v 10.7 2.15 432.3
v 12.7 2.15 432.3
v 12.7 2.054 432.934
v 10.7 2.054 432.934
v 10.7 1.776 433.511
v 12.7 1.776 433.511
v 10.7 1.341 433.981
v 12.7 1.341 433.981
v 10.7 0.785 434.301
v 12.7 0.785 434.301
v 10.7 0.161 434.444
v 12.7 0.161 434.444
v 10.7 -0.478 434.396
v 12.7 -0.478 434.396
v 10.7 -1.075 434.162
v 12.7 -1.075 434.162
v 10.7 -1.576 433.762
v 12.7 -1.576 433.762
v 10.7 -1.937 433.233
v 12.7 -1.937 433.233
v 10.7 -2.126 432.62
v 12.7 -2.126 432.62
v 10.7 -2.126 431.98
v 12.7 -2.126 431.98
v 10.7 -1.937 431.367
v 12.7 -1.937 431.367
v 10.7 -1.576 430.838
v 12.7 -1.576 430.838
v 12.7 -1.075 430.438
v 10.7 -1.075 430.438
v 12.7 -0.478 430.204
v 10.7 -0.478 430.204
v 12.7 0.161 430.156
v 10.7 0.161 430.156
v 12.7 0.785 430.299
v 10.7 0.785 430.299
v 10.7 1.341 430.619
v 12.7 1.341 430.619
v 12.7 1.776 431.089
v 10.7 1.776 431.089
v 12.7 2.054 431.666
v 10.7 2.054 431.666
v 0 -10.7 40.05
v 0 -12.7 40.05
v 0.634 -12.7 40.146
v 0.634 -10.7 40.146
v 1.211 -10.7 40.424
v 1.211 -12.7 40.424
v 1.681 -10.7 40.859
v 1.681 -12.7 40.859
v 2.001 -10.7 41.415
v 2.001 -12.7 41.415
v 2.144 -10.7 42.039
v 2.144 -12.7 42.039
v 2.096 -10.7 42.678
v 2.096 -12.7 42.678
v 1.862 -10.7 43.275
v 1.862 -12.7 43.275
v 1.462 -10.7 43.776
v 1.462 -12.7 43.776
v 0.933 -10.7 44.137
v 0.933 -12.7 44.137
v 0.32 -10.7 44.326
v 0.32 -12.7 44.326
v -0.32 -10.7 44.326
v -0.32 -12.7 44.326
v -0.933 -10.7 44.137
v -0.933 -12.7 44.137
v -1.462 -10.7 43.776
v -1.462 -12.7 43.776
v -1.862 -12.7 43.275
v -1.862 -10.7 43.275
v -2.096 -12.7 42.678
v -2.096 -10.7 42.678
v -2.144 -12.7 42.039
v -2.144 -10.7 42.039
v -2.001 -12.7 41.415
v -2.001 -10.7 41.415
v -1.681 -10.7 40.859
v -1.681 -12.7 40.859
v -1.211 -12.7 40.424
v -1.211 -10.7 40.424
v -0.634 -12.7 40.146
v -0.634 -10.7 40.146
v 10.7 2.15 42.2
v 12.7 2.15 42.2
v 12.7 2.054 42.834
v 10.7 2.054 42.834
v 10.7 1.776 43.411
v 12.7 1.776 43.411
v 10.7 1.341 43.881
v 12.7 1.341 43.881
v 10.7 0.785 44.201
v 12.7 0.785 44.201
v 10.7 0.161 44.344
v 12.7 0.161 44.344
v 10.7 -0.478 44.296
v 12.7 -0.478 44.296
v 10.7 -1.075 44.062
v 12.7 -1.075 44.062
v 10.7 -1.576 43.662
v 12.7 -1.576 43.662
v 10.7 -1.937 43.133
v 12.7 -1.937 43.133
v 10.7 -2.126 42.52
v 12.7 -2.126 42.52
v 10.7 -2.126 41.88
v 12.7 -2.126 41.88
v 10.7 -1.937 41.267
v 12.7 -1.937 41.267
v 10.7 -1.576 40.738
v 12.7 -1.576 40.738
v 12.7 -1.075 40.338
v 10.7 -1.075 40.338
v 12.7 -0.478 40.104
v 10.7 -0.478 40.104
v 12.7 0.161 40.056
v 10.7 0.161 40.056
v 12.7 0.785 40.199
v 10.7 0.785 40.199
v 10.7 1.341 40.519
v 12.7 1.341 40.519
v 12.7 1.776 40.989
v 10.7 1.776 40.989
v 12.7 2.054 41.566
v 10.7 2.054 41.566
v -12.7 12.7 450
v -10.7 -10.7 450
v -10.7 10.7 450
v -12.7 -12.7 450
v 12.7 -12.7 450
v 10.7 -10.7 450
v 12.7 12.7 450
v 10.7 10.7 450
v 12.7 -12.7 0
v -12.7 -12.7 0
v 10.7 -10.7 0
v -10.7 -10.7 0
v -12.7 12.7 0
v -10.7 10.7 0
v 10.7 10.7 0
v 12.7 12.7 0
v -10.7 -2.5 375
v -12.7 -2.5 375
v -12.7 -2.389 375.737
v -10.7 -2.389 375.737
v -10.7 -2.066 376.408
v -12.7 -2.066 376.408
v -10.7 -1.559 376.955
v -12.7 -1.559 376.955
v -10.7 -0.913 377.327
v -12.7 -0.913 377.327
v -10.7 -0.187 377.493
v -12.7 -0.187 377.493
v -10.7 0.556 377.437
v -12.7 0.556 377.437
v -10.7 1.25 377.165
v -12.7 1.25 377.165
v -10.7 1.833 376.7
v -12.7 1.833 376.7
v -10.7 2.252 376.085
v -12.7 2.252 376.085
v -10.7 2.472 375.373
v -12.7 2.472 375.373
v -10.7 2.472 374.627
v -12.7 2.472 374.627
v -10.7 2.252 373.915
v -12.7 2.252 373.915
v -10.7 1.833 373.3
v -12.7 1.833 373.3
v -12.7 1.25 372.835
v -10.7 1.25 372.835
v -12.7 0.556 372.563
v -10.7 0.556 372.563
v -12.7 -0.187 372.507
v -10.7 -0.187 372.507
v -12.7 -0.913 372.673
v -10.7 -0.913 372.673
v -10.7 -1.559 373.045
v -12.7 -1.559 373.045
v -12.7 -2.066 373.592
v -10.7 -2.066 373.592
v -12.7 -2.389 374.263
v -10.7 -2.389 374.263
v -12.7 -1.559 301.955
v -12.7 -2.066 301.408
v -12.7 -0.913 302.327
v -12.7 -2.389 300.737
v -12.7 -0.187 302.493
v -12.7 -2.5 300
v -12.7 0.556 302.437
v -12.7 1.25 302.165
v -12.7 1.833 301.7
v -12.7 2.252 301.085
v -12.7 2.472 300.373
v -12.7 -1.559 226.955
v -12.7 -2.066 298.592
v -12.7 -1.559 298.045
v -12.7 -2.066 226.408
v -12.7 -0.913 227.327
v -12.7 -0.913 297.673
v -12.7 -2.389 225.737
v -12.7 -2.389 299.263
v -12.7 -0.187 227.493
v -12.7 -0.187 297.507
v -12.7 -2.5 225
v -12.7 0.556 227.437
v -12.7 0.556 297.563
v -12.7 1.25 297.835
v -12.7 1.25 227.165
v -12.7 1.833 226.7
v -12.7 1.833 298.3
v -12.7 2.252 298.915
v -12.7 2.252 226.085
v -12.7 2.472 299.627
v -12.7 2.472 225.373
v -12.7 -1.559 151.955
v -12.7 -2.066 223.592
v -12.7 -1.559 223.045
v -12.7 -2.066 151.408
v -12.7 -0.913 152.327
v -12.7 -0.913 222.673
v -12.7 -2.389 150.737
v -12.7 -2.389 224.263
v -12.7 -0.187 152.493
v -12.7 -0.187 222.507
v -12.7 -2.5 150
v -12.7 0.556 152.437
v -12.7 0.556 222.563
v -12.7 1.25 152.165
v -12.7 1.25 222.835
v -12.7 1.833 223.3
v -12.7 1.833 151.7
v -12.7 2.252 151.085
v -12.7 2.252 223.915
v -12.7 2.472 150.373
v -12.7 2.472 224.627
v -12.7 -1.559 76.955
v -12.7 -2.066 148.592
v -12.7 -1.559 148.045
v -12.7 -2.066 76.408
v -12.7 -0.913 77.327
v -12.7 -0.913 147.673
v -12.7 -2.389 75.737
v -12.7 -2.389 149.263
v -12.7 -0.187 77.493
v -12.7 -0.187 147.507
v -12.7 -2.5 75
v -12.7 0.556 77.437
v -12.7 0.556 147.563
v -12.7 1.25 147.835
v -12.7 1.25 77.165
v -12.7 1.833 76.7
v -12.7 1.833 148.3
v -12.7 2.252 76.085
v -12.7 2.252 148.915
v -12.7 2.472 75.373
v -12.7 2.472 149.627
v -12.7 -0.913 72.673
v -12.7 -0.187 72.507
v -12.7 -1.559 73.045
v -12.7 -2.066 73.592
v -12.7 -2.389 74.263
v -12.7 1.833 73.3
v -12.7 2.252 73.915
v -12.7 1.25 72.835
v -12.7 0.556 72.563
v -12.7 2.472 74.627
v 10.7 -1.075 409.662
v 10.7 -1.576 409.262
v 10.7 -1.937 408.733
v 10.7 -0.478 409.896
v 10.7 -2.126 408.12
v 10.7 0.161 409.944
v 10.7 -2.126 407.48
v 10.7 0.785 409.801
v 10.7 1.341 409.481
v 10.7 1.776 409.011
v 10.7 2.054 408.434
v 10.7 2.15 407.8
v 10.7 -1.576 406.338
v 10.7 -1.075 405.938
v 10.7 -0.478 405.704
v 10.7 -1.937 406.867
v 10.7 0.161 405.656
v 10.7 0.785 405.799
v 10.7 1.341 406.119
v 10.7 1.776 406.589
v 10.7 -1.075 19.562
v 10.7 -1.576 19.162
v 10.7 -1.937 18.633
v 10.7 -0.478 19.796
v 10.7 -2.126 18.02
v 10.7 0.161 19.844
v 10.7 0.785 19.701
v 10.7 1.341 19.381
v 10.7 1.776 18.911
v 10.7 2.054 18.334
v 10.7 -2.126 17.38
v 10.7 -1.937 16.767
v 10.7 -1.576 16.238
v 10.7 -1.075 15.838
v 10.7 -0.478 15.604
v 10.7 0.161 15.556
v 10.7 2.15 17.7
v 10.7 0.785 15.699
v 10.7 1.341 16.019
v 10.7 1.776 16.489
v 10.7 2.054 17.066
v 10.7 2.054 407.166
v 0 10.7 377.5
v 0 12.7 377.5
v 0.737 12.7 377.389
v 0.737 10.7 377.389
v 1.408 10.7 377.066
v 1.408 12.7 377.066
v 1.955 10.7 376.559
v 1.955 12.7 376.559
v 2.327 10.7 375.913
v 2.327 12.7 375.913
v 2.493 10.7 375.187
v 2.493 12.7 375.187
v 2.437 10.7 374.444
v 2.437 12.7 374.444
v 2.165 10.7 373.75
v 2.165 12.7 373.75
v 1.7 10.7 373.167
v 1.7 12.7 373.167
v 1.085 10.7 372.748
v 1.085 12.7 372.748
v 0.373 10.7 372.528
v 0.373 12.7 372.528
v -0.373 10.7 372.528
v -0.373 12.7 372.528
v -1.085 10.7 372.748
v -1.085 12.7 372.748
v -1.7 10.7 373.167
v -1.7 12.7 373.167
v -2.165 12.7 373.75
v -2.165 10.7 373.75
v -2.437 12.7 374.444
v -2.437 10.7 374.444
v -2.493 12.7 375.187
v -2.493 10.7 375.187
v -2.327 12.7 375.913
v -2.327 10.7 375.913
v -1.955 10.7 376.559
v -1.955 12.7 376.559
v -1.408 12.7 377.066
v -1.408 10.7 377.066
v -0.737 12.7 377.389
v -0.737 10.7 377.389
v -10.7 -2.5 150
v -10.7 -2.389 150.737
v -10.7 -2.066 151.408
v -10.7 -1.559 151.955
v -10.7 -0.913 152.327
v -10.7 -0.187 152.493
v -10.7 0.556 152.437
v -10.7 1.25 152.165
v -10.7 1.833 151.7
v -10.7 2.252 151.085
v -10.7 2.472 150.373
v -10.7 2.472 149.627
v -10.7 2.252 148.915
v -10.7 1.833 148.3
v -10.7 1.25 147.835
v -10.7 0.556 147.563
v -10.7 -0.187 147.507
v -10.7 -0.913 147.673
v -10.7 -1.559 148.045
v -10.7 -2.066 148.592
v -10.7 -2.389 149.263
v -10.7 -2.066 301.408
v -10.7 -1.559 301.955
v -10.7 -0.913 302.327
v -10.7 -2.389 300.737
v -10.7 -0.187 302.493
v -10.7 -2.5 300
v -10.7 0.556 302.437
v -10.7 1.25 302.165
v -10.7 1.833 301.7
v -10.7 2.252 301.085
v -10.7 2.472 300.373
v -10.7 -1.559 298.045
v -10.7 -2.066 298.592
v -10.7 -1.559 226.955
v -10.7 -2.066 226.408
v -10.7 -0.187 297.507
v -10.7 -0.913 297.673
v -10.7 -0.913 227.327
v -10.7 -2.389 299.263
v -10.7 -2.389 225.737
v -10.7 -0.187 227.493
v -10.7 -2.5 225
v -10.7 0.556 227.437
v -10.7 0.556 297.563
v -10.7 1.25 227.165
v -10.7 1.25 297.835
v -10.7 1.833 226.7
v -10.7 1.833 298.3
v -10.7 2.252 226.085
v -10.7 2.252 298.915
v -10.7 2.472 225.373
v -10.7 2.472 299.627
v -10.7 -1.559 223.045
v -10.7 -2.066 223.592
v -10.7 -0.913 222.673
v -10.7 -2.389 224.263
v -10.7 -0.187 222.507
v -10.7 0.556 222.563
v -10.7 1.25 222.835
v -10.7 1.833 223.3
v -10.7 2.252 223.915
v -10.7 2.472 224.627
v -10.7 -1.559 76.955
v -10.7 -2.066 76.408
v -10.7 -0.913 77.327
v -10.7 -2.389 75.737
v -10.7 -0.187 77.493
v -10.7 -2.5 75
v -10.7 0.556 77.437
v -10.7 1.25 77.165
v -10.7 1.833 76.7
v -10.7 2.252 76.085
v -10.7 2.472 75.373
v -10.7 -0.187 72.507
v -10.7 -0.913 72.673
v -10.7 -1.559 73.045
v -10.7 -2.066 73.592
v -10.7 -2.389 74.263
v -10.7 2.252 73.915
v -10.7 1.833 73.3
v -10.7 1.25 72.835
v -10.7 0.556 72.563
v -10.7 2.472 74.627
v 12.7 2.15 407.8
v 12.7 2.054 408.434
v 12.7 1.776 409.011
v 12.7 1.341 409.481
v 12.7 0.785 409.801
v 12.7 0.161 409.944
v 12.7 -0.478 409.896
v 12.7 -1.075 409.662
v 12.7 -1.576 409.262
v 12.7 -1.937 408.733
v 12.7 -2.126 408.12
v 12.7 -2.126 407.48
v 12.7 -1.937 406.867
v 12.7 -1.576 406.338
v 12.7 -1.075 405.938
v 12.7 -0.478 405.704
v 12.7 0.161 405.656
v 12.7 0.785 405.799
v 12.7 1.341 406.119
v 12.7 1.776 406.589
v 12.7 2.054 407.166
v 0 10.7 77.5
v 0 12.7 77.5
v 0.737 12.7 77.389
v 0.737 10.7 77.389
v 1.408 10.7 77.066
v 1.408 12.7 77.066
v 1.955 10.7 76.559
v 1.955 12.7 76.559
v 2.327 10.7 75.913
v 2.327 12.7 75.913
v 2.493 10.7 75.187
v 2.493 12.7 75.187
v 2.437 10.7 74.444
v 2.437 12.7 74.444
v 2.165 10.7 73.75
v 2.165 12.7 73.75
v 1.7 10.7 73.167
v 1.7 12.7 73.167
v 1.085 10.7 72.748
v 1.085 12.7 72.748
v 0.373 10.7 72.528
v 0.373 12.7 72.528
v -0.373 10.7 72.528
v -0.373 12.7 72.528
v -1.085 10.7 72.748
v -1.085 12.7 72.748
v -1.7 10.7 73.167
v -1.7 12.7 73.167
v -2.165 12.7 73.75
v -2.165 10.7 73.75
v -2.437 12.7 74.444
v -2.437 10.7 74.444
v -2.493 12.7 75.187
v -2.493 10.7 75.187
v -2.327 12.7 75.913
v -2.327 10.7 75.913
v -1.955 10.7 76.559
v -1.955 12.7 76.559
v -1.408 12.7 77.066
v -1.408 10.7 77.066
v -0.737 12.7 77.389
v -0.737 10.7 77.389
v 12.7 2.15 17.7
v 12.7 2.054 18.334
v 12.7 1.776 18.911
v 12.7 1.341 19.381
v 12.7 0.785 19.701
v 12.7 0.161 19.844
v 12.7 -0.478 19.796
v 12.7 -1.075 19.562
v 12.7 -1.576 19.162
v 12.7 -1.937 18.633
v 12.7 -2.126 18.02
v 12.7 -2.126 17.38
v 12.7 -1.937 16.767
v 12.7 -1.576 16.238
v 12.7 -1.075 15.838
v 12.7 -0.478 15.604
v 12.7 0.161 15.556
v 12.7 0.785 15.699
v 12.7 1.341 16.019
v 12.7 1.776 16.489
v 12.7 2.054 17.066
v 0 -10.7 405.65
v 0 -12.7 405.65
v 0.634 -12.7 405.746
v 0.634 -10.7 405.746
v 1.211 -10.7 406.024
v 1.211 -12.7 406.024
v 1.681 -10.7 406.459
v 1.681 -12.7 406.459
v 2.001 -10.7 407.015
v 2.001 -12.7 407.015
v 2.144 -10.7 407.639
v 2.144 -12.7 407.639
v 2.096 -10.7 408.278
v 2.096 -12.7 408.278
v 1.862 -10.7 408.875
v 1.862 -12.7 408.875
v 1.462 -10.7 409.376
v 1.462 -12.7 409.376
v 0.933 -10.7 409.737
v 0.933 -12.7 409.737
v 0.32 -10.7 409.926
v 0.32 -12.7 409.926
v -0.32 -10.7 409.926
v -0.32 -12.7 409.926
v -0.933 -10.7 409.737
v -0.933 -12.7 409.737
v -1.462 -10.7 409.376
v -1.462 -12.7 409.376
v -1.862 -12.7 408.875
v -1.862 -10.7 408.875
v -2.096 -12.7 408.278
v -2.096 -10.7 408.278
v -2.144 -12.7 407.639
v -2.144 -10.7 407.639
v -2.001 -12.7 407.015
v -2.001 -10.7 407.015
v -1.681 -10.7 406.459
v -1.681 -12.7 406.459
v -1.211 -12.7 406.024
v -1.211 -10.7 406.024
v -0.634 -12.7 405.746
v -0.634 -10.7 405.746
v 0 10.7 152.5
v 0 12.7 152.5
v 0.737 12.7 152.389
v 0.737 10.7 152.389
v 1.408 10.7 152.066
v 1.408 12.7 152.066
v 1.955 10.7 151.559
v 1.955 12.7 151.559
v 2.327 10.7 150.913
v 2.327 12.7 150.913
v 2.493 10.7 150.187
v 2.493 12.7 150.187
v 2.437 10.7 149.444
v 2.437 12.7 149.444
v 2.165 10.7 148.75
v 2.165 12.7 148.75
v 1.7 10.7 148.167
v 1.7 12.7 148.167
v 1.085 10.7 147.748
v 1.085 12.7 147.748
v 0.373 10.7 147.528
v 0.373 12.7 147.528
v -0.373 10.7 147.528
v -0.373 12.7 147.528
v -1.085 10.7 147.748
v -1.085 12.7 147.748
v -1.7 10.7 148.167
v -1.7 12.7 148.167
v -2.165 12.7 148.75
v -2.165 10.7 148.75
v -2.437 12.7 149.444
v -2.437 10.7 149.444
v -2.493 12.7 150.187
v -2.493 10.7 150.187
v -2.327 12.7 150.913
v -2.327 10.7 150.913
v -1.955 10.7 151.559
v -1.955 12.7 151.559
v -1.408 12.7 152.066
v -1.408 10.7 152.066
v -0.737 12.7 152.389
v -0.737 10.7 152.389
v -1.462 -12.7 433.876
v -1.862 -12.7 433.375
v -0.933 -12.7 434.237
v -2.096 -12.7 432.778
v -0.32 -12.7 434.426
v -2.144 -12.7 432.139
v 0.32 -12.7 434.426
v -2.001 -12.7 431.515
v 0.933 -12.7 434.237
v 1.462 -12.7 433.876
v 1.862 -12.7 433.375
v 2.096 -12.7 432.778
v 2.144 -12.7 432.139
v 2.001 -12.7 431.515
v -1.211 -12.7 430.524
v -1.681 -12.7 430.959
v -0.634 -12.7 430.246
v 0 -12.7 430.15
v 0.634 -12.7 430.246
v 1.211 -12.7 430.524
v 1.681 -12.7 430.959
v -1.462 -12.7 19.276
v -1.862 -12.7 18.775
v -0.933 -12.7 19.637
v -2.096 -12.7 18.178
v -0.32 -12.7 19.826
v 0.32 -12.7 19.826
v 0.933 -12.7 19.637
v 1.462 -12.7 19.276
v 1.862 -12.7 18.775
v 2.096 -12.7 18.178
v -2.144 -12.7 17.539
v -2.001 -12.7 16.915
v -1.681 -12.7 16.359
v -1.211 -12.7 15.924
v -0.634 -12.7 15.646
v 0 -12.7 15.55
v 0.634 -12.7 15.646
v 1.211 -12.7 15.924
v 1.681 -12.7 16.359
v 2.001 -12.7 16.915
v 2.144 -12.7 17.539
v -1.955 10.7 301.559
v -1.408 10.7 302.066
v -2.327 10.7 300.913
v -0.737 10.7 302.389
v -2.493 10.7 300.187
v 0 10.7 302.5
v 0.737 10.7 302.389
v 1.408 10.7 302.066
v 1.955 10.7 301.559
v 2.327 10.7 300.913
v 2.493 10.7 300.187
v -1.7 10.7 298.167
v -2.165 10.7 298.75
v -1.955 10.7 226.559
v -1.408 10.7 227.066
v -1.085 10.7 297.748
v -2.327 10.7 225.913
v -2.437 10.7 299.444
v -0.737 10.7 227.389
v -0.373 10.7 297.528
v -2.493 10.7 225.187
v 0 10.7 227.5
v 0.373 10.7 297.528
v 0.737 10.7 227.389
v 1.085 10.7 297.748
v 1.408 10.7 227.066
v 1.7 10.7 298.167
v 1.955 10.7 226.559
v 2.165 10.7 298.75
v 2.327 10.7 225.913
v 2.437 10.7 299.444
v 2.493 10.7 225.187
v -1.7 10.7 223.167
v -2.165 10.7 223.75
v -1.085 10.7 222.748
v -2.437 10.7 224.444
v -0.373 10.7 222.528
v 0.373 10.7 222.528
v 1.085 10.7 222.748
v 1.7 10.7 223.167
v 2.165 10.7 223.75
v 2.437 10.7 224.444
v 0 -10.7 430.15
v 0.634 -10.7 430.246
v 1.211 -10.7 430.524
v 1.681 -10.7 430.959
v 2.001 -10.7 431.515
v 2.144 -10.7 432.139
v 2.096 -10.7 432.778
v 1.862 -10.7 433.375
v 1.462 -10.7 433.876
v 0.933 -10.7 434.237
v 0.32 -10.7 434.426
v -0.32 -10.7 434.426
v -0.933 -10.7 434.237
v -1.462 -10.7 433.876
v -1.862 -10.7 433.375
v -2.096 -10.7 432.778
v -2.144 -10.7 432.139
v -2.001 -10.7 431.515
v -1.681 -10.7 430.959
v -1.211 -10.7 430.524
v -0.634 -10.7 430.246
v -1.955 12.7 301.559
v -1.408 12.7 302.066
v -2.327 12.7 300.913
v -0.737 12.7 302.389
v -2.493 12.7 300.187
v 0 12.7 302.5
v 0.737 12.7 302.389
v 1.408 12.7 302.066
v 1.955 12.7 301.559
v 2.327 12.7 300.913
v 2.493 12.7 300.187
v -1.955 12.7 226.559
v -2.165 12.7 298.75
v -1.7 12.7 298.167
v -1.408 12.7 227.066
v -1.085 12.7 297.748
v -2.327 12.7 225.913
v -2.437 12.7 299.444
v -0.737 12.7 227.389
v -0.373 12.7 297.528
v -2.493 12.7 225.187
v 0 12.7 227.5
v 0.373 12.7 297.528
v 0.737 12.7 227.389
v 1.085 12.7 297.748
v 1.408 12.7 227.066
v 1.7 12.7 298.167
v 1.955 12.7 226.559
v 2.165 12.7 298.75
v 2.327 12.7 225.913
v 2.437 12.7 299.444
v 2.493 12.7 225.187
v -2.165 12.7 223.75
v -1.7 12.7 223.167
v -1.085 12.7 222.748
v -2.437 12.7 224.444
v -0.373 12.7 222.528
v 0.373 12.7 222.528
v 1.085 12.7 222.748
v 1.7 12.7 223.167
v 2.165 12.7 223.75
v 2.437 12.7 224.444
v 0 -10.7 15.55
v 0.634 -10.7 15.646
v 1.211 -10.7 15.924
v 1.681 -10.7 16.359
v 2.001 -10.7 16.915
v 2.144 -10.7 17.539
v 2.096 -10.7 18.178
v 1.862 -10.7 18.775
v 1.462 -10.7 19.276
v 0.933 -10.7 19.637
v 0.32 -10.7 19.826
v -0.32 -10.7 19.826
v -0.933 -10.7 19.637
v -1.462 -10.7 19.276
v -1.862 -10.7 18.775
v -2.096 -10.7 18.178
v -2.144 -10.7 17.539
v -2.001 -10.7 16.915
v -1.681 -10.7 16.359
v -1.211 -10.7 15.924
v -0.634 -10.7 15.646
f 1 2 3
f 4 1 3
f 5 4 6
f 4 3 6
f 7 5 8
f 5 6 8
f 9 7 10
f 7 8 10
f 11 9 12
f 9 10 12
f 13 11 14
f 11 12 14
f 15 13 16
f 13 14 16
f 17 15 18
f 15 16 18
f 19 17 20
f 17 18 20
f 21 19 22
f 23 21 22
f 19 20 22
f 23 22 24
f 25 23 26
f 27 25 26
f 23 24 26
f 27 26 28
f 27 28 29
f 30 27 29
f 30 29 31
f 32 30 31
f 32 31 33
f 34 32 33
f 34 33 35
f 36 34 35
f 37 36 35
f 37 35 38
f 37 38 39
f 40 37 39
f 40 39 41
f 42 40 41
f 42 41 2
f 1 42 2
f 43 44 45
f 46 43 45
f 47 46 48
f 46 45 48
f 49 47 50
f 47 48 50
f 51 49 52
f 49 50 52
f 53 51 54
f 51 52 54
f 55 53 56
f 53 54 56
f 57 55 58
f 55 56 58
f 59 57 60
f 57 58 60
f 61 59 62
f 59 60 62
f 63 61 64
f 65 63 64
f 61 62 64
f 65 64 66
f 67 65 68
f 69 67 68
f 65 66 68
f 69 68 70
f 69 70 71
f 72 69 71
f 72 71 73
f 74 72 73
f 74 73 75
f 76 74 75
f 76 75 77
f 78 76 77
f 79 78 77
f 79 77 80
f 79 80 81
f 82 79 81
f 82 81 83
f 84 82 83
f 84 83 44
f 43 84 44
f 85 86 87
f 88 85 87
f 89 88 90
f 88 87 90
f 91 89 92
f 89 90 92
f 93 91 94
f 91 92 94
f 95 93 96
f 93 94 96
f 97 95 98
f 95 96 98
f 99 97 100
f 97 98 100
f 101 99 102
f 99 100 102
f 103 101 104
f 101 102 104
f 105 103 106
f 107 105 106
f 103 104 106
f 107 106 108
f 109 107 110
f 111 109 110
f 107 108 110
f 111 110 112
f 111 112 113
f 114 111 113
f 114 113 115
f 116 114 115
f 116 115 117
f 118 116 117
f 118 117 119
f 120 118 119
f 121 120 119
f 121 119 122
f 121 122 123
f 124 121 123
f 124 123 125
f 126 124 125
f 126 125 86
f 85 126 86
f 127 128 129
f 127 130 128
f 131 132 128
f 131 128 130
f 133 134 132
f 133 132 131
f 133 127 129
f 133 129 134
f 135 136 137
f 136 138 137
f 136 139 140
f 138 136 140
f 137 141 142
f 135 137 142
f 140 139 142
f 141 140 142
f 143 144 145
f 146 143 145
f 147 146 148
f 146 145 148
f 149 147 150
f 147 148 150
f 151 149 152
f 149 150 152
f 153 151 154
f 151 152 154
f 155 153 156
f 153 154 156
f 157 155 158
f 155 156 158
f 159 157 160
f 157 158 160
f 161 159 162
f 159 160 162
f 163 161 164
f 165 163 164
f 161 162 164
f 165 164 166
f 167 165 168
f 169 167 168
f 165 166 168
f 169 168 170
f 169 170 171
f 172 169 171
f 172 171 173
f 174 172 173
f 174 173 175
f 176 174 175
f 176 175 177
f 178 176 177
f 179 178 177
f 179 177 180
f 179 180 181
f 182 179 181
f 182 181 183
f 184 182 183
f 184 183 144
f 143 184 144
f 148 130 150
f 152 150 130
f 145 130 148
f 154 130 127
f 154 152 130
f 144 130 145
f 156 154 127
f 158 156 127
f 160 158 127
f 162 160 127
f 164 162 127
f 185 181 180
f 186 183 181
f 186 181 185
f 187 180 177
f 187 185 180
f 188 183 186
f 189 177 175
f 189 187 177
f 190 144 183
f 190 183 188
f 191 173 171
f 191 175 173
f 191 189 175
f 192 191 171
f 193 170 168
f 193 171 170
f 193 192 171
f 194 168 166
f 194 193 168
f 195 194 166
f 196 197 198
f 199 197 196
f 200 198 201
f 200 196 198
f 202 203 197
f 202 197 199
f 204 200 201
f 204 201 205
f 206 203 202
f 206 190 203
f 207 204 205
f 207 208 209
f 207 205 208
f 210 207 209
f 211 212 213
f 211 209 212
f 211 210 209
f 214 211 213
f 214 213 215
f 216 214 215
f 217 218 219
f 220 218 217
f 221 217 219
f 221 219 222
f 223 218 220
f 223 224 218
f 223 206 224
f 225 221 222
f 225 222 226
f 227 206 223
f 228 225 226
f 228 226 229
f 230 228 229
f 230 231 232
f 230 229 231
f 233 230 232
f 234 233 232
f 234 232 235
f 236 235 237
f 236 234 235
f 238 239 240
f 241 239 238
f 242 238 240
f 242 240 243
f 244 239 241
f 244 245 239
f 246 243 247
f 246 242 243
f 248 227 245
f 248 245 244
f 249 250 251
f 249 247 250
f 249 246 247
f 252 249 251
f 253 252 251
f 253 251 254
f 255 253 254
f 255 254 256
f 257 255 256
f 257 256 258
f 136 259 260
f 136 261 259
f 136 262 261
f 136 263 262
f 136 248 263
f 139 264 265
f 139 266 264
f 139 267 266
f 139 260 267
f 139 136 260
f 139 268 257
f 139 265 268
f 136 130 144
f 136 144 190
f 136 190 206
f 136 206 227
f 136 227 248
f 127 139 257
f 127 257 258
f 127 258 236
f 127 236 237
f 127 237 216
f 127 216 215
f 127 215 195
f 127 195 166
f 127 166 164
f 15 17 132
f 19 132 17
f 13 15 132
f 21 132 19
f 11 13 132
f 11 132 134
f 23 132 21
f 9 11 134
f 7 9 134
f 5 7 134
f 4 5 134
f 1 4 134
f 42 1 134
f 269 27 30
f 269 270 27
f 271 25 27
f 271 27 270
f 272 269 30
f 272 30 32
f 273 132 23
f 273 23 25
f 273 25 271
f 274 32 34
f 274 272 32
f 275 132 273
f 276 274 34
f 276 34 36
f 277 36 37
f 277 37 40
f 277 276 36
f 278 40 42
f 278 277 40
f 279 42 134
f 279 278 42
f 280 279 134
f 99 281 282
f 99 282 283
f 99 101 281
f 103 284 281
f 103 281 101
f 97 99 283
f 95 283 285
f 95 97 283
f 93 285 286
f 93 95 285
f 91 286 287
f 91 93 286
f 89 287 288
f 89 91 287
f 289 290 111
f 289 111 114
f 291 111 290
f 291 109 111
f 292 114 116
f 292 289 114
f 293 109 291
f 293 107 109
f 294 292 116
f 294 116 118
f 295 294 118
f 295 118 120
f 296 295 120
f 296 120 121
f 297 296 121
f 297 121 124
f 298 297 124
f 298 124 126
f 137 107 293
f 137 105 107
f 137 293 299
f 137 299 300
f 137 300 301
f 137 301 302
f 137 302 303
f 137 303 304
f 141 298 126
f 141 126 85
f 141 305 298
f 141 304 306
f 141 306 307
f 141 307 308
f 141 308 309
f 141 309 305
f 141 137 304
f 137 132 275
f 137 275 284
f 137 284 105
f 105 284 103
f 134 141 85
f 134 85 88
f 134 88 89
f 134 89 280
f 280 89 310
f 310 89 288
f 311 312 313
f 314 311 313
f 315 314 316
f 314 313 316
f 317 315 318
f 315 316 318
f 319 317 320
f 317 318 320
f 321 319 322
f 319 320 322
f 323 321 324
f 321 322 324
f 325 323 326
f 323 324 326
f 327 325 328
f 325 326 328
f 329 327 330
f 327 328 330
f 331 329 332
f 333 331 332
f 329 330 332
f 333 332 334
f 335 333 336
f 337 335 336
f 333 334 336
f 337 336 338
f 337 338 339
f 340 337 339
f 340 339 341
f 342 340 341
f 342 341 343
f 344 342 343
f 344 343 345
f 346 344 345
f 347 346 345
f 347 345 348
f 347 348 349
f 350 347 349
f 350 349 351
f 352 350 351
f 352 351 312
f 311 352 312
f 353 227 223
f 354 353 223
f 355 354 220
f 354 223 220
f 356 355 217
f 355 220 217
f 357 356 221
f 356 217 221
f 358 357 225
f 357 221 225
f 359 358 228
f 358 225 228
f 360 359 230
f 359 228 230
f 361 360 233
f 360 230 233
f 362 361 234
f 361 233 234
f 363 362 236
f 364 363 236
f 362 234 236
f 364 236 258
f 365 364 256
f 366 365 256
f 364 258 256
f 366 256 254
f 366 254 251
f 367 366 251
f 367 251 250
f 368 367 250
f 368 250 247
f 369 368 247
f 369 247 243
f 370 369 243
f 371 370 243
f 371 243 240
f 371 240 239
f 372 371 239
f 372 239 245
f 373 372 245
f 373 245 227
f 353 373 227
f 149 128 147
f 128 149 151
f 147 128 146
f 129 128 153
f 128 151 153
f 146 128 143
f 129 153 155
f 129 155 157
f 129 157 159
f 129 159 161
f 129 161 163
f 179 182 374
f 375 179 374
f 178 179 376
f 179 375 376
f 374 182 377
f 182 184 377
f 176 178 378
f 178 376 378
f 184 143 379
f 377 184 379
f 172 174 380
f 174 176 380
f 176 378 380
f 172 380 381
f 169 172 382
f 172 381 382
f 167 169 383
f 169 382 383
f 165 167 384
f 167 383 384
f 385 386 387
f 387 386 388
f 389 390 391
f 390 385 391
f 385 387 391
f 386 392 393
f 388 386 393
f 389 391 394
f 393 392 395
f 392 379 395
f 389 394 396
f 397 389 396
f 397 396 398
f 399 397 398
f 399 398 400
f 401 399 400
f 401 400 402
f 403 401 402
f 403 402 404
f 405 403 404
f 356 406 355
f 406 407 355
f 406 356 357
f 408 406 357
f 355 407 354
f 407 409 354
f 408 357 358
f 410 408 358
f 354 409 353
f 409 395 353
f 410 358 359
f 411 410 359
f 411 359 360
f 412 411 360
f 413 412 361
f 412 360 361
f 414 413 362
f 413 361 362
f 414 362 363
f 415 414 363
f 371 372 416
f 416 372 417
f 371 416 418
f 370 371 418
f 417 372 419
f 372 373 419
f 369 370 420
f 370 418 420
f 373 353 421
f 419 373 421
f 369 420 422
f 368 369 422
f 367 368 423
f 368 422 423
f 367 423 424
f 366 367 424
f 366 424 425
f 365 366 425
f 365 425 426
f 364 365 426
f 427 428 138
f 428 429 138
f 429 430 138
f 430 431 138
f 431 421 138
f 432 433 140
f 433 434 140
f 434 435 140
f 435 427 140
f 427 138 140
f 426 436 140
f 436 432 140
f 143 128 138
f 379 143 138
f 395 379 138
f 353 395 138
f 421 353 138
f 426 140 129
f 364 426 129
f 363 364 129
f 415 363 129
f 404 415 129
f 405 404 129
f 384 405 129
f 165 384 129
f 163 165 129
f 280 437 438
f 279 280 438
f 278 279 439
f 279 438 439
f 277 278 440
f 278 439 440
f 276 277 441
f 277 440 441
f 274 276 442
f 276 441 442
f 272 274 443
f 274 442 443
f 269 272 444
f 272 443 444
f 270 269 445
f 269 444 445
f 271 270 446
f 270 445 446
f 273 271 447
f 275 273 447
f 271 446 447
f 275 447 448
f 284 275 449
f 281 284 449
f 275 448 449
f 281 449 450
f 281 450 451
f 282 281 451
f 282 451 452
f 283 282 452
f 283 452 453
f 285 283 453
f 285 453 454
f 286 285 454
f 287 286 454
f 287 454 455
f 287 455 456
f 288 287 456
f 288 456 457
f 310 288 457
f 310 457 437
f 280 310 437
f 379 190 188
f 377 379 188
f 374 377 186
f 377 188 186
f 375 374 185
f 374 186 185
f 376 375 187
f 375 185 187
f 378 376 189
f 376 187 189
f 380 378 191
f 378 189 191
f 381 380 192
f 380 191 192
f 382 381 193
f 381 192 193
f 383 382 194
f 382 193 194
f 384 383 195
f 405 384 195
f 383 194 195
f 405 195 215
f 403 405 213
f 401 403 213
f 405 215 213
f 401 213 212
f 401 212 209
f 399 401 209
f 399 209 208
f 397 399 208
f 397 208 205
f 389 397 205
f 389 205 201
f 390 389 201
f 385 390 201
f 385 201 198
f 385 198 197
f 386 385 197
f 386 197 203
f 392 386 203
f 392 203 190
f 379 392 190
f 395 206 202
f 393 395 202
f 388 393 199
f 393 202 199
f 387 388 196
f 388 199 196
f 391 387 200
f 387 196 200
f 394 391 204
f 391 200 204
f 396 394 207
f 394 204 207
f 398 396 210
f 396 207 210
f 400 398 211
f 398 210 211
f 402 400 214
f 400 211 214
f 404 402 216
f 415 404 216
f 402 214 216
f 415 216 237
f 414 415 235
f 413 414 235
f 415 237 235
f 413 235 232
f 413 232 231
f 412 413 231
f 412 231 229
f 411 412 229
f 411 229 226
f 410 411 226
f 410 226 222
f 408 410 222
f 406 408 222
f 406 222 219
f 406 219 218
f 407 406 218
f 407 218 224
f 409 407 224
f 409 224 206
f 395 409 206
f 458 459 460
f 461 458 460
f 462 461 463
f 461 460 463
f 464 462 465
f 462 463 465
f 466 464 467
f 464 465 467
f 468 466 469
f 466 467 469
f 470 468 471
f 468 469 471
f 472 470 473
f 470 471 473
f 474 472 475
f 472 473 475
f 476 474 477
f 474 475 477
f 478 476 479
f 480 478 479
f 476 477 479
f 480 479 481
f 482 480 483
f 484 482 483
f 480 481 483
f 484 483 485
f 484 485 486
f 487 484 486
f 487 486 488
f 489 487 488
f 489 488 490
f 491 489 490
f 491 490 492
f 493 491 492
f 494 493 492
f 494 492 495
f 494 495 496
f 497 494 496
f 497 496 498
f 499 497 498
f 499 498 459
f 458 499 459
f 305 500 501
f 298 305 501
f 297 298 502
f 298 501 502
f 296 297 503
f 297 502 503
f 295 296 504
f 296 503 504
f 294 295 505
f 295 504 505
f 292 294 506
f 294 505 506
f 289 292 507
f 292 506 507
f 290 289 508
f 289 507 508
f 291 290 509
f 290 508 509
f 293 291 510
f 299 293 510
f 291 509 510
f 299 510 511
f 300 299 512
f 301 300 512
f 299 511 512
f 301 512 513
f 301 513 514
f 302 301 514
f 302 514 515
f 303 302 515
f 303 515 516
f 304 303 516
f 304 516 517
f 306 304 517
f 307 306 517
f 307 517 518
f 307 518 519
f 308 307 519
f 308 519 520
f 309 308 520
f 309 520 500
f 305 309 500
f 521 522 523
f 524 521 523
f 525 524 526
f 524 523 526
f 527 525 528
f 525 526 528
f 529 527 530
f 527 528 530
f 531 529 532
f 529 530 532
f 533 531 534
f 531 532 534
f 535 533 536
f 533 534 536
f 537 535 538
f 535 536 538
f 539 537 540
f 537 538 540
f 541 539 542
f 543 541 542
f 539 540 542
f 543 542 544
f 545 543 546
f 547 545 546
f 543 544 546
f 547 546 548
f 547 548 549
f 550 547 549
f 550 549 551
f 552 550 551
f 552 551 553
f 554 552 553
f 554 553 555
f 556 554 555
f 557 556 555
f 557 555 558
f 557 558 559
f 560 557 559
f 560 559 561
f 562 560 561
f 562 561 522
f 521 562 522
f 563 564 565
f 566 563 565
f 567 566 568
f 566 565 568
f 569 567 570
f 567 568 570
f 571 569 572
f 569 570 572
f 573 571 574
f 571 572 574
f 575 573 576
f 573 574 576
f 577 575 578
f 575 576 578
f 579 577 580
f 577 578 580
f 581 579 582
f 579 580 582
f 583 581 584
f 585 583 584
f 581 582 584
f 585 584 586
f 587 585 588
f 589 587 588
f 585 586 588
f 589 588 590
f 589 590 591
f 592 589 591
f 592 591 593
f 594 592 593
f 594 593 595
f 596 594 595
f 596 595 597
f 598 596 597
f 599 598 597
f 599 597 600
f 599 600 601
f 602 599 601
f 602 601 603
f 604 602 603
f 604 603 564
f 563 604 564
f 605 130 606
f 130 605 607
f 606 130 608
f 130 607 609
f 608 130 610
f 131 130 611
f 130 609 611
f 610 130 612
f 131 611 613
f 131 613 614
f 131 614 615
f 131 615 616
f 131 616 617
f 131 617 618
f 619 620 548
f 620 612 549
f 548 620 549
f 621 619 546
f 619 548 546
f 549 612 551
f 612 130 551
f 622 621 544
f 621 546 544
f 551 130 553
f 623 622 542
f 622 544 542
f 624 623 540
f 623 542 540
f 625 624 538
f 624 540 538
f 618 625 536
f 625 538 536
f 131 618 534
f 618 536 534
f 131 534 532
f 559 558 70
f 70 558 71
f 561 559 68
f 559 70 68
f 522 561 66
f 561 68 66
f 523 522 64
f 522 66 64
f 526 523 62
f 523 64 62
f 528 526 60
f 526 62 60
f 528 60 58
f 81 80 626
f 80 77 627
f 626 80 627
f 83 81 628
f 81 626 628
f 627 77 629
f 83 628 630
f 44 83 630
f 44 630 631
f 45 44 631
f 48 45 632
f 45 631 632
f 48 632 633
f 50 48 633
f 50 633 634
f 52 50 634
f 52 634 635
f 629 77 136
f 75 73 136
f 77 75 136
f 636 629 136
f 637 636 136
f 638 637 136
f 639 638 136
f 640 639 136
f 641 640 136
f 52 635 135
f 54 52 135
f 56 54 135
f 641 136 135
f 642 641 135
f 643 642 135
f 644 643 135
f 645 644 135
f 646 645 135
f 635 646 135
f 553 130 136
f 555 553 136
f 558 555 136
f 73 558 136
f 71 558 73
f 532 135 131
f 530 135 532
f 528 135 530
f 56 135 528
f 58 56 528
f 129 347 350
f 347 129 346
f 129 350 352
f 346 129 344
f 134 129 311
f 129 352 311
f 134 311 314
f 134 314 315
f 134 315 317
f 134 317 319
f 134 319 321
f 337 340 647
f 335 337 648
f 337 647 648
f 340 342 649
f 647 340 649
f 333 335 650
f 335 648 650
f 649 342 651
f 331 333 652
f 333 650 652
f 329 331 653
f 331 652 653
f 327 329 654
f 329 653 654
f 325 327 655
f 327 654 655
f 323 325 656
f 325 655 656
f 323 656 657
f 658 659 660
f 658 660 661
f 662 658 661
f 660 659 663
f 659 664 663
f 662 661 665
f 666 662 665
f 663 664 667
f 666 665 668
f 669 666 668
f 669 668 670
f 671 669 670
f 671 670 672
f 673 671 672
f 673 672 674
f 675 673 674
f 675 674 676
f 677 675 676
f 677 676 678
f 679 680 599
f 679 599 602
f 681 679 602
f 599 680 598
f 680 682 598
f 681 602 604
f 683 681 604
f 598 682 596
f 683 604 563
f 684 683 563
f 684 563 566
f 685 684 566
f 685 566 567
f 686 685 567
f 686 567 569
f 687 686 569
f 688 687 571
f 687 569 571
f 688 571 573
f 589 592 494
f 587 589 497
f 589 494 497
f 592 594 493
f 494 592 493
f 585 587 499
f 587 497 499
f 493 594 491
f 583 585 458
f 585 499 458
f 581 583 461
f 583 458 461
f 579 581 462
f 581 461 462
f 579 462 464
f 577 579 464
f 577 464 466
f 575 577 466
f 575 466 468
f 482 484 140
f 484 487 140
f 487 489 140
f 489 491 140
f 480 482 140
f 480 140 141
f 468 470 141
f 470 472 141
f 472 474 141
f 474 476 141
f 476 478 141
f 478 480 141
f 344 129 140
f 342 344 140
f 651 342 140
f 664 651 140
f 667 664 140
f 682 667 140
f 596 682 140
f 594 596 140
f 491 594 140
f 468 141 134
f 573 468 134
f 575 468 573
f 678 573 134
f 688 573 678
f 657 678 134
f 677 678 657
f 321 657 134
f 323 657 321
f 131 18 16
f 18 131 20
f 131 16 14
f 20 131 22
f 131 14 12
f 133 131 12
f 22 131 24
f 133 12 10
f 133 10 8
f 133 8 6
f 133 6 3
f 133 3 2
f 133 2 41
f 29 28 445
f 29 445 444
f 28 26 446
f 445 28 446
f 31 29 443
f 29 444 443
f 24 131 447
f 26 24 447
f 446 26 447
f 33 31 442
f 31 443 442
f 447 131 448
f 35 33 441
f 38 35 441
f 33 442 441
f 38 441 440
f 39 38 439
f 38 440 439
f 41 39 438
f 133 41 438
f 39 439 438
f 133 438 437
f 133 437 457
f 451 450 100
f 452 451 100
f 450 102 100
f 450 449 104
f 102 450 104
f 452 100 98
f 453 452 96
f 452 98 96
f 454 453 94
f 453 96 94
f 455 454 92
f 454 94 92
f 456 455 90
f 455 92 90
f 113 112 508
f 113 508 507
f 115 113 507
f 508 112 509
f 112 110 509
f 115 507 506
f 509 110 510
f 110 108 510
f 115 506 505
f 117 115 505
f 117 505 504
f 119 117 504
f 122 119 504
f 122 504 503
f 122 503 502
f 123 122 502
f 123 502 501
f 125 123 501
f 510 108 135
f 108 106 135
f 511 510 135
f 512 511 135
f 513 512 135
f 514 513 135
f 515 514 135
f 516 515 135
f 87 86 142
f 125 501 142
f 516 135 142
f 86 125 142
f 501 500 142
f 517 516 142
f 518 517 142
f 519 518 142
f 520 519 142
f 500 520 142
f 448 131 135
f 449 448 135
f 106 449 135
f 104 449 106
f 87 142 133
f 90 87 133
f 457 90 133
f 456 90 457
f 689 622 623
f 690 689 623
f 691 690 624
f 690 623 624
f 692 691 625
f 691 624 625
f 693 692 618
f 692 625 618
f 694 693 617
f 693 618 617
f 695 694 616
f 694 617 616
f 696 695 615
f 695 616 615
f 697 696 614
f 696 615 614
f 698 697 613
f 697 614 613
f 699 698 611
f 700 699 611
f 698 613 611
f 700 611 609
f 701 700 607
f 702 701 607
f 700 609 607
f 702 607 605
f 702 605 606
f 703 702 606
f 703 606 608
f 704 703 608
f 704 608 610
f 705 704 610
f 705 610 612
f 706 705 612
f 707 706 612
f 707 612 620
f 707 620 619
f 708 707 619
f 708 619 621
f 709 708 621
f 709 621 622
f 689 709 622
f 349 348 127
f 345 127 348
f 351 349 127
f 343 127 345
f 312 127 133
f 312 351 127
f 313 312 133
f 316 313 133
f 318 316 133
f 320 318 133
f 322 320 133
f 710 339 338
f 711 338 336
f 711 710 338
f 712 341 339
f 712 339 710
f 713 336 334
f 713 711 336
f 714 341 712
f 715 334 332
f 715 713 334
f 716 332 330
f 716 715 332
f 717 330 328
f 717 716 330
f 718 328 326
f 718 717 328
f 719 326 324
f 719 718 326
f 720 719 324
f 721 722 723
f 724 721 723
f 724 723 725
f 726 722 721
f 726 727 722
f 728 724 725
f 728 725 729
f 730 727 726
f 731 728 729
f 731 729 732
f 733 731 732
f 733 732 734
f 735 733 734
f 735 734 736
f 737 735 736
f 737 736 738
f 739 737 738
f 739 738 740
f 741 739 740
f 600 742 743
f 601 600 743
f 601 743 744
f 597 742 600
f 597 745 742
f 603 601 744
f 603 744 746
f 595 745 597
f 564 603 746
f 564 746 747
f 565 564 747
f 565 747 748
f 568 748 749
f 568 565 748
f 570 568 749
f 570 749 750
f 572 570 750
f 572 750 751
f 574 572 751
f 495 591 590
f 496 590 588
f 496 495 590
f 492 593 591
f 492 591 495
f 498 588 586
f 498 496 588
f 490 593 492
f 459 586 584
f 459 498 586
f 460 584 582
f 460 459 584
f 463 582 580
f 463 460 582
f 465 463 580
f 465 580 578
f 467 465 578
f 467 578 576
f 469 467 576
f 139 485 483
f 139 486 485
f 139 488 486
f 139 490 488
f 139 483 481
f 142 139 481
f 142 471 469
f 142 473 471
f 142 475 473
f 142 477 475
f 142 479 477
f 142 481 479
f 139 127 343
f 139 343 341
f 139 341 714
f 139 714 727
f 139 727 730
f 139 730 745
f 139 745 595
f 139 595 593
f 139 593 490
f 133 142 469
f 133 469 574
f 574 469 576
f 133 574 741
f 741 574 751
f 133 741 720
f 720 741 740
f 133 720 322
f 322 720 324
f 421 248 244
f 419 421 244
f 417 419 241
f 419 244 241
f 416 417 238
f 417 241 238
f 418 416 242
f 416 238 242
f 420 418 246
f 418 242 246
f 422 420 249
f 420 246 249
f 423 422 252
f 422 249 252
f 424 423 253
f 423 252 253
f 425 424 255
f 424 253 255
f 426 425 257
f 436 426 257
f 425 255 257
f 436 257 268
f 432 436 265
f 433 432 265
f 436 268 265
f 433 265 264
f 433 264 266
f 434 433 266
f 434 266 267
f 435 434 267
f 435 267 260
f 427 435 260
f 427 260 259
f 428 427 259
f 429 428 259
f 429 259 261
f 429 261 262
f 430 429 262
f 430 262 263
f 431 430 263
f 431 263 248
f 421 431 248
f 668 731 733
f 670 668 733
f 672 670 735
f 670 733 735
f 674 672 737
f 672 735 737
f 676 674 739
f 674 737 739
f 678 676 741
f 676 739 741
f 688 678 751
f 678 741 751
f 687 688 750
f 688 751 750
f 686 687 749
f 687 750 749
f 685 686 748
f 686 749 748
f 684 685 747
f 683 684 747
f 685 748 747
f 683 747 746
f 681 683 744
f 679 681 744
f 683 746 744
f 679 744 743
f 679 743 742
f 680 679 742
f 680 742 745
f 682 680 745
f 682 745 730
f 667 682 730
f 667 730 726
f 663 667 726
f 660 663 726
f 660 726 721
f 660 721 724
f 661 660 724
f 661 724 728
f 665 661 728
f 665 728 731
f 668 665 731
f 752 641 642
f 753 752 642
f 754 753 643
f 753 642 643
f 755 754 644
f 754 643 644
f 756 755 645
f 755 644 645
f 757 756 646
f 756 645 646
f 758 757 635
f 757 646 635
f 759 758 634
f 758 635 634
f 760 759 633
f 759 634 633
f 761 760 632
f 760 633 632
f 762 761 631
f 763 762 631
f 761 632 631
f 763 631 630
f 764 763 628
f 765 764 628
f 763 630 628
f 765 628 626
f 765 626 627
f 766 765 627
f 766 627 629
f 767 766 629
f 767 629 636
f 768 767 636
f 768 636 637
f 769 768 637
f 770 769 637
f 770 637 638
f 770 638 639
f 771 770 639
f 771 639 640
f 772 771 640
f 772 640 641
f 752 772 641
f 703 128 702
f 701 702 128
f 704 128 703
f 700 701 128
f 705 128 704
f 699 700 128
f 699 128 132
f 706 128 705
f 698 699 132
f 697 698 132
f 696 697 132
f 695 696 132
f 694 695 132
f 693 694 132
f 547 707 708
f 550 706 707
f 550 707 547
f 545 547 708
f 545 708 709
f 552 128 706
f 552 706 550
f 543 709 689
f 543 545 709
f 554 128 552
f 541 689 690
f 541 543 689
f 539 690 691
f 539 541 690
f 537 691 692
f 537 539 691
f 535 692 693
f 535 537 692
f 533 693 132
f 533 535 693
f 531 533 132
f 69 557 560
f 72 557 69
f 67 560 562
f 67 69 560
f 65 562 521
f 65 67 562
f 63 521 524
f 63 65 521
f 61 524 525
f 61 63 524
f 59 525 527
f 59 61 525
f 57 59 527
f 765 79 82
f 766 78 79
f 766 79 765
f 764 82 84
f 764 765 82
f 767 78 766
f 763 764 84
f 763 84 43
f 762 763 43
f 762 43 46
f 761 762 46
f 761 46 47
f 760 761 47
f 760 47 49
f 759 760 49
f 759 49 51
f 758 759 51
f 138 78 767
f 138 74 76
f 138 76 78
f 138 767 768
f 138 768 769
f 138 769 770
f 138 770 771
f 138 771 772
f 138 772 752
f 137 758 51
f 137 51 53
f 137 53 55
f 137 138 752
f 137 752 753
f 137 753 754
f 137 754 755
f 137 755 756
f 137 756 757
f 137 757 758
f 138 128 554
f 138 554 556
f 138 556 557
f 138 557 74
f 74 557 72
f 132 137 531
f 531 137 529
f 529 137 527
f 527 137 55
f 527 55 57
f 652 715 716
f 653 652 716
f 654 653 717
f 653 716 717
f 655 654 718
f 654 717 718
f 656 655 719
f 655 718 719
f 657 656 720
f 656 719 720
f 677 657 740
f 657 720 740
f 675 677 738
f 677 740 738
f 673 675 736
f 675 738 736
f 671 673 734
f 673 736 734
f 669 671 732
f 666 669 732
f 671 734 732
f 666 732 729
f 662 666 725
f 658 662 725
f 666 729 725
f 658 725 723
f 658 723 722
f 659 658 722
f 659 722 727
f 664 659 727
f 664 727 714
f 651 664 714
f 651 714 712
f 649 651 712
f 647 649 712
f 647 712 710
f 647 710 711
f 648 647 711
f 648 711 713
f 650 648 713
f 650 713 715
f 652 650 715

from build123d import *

# Parameters (mm, degrees)
SKETCH_1_W          = 25.4
SKETCH_1_H          = 25.4
EXTRUDE_1_DEPTH     = 450
SKETCH_1_3_W        = 21.4
SKETCH_1_3_H        = 21.4
CUT_EXTRUDE_1_DEPTH = 451.358279595
SKETCH_2_R          = 2.15
CUT_EXTRUDE_2_DEPTH = 3
SKETCH_3_R          = 2.15
CUT_EXTRUDE_3_DEPTH = 3
SKETCH_4_R          = 2.15
CUT_EXTRUDE_4_DEPTH = 3
SKETCH_5_R          = 2.15
CUT_EXTRUDE_5_DEPTH = 3
SKETCH_6_R          = 2.5
CUT_EXTRUDE_6_DEPTH = 10
SKETCH_8_R          = 2.5
CUT_EXTRUDE_7_DEPTH = 10


with BuildPart() as part:
    # 草圖1 → 填料-伸長1 (new body)
    with BuildSketch(Plane.XY):
        Rectangle(SKETCH_1_W, SKETCH_1_H)
    extrude(amount=EXTRUDE_1_DEPTH)

    # 草圖1<3> → 除料-伸長1 (cut, through all)
    with BuildSketch(Plane.XY):
        Rectangle(SKETCH_1_3_W, SKETCH_1_3_H)
    extrude(amount=CUT_EXTRUDE_1_DEPTH, mode=Mode.SUBTRACT)

    # 草圖2 → 除料-伸長2 (cut)
    with BuildSketch(Plane.XZ.offset(12.7)):
        with Locations((0, 17.7)):
            Circle(SKETCH_2_R)
        with Locations((0, 42.2)):
            Circle(SKETCH_2_R)
    extrude(amount=-CUT_EXTRUDE_2_DEPTH, mode=Mode.SUBTRACT)

    # 草圖3 → 除料-伸長3 (cut)
    with BuildSketch(Plane(origin=(12.7, 0, 0), x_dir=(0, 0, -1), z_dir=(1, 0, 0))):
        with Locations((-42.2, 0)):
            Circle(SKETCH_3_R)
        with Locations((-17.7, 0)):
            Circle(SKETCH_3_R)
    extrude(amount=-CUT_EXTRUDE_3_DEPTH, mode=Mode.SUBTRACT)

    # 草圖4 → 除料-伸長4 (cut)
    with BuildSketch(Plane(origin=(12.7, 0, 0), x_dir=(0, 0, -1), z_dir=(1, 0, 0))):
        with Locations((-407.8, 0)):
            Circle(SKETCH_4_R)
        with Locations((-432.3, 0)):
            Circle(SKETCH_4_R)
    extrude(amount=-CUT_EXTRUDE_4_DEPTH, mode=Mode.SUBTRACT)

    # 草圖5 → 除料-伸長5 (cut)
    with BuildSketch(Plane.XZ.offset(12.7)):
        with Locations((0, 407.8)):
            Circle(SKETCH_5_R)
        with Locations((0, 432.3)):
            Circle(SKETCH_5_R)
    extrude(amount=-CUT_EXTRUDE_5_DEPTH, mode=Mode.SUBTRACT)

    # 草圖6 → 除料-伸長6 (cut)
    with BuildSketch(Plane(origin=(0, 12.7, 0), x_dir=(1, 0, 0), z_dir=(0, 1, 0))):
        with Locations((0, -375)):
            Circle(SKETCH_6_R)
        with Locations((0, -300)):
            Circle(SKETCH_6_R)
        with Locations((0, -225)):
            Circle(SKETCH_6_R)
        with Locations((0, -150)):
            Circle(SKETCH_6_R)
        with Locations((0, -75)):
            Circle(SKETCH_6_R)
    extrude(amount=-CUT_EXTRUDE_6_DEPTH, mode=Mode.SUBTRACT)

    # 草圖8 → 除料-伸長7 (cut)
    with BuildSketch(Plane.ZY.offset(12.7)):
        with Locations((375, 0)):
            Circle(SKETCH_8_R)
        with Locations((300, 0)):
            Circle(SKETCH_8_R)
        with Locations((225, 0)):
            Circle(SKETCH_8_R)
        with Locations((150, 0)):
            Circle(SKETCH_8_R)
        with Locations((75, 0)):
            Circle(SKETCH_8_R)
    extrude(amount=-CUT_EXTRUDE_7_DEPTH, mode=Mode.SUBTRACT)


solid = part.part
